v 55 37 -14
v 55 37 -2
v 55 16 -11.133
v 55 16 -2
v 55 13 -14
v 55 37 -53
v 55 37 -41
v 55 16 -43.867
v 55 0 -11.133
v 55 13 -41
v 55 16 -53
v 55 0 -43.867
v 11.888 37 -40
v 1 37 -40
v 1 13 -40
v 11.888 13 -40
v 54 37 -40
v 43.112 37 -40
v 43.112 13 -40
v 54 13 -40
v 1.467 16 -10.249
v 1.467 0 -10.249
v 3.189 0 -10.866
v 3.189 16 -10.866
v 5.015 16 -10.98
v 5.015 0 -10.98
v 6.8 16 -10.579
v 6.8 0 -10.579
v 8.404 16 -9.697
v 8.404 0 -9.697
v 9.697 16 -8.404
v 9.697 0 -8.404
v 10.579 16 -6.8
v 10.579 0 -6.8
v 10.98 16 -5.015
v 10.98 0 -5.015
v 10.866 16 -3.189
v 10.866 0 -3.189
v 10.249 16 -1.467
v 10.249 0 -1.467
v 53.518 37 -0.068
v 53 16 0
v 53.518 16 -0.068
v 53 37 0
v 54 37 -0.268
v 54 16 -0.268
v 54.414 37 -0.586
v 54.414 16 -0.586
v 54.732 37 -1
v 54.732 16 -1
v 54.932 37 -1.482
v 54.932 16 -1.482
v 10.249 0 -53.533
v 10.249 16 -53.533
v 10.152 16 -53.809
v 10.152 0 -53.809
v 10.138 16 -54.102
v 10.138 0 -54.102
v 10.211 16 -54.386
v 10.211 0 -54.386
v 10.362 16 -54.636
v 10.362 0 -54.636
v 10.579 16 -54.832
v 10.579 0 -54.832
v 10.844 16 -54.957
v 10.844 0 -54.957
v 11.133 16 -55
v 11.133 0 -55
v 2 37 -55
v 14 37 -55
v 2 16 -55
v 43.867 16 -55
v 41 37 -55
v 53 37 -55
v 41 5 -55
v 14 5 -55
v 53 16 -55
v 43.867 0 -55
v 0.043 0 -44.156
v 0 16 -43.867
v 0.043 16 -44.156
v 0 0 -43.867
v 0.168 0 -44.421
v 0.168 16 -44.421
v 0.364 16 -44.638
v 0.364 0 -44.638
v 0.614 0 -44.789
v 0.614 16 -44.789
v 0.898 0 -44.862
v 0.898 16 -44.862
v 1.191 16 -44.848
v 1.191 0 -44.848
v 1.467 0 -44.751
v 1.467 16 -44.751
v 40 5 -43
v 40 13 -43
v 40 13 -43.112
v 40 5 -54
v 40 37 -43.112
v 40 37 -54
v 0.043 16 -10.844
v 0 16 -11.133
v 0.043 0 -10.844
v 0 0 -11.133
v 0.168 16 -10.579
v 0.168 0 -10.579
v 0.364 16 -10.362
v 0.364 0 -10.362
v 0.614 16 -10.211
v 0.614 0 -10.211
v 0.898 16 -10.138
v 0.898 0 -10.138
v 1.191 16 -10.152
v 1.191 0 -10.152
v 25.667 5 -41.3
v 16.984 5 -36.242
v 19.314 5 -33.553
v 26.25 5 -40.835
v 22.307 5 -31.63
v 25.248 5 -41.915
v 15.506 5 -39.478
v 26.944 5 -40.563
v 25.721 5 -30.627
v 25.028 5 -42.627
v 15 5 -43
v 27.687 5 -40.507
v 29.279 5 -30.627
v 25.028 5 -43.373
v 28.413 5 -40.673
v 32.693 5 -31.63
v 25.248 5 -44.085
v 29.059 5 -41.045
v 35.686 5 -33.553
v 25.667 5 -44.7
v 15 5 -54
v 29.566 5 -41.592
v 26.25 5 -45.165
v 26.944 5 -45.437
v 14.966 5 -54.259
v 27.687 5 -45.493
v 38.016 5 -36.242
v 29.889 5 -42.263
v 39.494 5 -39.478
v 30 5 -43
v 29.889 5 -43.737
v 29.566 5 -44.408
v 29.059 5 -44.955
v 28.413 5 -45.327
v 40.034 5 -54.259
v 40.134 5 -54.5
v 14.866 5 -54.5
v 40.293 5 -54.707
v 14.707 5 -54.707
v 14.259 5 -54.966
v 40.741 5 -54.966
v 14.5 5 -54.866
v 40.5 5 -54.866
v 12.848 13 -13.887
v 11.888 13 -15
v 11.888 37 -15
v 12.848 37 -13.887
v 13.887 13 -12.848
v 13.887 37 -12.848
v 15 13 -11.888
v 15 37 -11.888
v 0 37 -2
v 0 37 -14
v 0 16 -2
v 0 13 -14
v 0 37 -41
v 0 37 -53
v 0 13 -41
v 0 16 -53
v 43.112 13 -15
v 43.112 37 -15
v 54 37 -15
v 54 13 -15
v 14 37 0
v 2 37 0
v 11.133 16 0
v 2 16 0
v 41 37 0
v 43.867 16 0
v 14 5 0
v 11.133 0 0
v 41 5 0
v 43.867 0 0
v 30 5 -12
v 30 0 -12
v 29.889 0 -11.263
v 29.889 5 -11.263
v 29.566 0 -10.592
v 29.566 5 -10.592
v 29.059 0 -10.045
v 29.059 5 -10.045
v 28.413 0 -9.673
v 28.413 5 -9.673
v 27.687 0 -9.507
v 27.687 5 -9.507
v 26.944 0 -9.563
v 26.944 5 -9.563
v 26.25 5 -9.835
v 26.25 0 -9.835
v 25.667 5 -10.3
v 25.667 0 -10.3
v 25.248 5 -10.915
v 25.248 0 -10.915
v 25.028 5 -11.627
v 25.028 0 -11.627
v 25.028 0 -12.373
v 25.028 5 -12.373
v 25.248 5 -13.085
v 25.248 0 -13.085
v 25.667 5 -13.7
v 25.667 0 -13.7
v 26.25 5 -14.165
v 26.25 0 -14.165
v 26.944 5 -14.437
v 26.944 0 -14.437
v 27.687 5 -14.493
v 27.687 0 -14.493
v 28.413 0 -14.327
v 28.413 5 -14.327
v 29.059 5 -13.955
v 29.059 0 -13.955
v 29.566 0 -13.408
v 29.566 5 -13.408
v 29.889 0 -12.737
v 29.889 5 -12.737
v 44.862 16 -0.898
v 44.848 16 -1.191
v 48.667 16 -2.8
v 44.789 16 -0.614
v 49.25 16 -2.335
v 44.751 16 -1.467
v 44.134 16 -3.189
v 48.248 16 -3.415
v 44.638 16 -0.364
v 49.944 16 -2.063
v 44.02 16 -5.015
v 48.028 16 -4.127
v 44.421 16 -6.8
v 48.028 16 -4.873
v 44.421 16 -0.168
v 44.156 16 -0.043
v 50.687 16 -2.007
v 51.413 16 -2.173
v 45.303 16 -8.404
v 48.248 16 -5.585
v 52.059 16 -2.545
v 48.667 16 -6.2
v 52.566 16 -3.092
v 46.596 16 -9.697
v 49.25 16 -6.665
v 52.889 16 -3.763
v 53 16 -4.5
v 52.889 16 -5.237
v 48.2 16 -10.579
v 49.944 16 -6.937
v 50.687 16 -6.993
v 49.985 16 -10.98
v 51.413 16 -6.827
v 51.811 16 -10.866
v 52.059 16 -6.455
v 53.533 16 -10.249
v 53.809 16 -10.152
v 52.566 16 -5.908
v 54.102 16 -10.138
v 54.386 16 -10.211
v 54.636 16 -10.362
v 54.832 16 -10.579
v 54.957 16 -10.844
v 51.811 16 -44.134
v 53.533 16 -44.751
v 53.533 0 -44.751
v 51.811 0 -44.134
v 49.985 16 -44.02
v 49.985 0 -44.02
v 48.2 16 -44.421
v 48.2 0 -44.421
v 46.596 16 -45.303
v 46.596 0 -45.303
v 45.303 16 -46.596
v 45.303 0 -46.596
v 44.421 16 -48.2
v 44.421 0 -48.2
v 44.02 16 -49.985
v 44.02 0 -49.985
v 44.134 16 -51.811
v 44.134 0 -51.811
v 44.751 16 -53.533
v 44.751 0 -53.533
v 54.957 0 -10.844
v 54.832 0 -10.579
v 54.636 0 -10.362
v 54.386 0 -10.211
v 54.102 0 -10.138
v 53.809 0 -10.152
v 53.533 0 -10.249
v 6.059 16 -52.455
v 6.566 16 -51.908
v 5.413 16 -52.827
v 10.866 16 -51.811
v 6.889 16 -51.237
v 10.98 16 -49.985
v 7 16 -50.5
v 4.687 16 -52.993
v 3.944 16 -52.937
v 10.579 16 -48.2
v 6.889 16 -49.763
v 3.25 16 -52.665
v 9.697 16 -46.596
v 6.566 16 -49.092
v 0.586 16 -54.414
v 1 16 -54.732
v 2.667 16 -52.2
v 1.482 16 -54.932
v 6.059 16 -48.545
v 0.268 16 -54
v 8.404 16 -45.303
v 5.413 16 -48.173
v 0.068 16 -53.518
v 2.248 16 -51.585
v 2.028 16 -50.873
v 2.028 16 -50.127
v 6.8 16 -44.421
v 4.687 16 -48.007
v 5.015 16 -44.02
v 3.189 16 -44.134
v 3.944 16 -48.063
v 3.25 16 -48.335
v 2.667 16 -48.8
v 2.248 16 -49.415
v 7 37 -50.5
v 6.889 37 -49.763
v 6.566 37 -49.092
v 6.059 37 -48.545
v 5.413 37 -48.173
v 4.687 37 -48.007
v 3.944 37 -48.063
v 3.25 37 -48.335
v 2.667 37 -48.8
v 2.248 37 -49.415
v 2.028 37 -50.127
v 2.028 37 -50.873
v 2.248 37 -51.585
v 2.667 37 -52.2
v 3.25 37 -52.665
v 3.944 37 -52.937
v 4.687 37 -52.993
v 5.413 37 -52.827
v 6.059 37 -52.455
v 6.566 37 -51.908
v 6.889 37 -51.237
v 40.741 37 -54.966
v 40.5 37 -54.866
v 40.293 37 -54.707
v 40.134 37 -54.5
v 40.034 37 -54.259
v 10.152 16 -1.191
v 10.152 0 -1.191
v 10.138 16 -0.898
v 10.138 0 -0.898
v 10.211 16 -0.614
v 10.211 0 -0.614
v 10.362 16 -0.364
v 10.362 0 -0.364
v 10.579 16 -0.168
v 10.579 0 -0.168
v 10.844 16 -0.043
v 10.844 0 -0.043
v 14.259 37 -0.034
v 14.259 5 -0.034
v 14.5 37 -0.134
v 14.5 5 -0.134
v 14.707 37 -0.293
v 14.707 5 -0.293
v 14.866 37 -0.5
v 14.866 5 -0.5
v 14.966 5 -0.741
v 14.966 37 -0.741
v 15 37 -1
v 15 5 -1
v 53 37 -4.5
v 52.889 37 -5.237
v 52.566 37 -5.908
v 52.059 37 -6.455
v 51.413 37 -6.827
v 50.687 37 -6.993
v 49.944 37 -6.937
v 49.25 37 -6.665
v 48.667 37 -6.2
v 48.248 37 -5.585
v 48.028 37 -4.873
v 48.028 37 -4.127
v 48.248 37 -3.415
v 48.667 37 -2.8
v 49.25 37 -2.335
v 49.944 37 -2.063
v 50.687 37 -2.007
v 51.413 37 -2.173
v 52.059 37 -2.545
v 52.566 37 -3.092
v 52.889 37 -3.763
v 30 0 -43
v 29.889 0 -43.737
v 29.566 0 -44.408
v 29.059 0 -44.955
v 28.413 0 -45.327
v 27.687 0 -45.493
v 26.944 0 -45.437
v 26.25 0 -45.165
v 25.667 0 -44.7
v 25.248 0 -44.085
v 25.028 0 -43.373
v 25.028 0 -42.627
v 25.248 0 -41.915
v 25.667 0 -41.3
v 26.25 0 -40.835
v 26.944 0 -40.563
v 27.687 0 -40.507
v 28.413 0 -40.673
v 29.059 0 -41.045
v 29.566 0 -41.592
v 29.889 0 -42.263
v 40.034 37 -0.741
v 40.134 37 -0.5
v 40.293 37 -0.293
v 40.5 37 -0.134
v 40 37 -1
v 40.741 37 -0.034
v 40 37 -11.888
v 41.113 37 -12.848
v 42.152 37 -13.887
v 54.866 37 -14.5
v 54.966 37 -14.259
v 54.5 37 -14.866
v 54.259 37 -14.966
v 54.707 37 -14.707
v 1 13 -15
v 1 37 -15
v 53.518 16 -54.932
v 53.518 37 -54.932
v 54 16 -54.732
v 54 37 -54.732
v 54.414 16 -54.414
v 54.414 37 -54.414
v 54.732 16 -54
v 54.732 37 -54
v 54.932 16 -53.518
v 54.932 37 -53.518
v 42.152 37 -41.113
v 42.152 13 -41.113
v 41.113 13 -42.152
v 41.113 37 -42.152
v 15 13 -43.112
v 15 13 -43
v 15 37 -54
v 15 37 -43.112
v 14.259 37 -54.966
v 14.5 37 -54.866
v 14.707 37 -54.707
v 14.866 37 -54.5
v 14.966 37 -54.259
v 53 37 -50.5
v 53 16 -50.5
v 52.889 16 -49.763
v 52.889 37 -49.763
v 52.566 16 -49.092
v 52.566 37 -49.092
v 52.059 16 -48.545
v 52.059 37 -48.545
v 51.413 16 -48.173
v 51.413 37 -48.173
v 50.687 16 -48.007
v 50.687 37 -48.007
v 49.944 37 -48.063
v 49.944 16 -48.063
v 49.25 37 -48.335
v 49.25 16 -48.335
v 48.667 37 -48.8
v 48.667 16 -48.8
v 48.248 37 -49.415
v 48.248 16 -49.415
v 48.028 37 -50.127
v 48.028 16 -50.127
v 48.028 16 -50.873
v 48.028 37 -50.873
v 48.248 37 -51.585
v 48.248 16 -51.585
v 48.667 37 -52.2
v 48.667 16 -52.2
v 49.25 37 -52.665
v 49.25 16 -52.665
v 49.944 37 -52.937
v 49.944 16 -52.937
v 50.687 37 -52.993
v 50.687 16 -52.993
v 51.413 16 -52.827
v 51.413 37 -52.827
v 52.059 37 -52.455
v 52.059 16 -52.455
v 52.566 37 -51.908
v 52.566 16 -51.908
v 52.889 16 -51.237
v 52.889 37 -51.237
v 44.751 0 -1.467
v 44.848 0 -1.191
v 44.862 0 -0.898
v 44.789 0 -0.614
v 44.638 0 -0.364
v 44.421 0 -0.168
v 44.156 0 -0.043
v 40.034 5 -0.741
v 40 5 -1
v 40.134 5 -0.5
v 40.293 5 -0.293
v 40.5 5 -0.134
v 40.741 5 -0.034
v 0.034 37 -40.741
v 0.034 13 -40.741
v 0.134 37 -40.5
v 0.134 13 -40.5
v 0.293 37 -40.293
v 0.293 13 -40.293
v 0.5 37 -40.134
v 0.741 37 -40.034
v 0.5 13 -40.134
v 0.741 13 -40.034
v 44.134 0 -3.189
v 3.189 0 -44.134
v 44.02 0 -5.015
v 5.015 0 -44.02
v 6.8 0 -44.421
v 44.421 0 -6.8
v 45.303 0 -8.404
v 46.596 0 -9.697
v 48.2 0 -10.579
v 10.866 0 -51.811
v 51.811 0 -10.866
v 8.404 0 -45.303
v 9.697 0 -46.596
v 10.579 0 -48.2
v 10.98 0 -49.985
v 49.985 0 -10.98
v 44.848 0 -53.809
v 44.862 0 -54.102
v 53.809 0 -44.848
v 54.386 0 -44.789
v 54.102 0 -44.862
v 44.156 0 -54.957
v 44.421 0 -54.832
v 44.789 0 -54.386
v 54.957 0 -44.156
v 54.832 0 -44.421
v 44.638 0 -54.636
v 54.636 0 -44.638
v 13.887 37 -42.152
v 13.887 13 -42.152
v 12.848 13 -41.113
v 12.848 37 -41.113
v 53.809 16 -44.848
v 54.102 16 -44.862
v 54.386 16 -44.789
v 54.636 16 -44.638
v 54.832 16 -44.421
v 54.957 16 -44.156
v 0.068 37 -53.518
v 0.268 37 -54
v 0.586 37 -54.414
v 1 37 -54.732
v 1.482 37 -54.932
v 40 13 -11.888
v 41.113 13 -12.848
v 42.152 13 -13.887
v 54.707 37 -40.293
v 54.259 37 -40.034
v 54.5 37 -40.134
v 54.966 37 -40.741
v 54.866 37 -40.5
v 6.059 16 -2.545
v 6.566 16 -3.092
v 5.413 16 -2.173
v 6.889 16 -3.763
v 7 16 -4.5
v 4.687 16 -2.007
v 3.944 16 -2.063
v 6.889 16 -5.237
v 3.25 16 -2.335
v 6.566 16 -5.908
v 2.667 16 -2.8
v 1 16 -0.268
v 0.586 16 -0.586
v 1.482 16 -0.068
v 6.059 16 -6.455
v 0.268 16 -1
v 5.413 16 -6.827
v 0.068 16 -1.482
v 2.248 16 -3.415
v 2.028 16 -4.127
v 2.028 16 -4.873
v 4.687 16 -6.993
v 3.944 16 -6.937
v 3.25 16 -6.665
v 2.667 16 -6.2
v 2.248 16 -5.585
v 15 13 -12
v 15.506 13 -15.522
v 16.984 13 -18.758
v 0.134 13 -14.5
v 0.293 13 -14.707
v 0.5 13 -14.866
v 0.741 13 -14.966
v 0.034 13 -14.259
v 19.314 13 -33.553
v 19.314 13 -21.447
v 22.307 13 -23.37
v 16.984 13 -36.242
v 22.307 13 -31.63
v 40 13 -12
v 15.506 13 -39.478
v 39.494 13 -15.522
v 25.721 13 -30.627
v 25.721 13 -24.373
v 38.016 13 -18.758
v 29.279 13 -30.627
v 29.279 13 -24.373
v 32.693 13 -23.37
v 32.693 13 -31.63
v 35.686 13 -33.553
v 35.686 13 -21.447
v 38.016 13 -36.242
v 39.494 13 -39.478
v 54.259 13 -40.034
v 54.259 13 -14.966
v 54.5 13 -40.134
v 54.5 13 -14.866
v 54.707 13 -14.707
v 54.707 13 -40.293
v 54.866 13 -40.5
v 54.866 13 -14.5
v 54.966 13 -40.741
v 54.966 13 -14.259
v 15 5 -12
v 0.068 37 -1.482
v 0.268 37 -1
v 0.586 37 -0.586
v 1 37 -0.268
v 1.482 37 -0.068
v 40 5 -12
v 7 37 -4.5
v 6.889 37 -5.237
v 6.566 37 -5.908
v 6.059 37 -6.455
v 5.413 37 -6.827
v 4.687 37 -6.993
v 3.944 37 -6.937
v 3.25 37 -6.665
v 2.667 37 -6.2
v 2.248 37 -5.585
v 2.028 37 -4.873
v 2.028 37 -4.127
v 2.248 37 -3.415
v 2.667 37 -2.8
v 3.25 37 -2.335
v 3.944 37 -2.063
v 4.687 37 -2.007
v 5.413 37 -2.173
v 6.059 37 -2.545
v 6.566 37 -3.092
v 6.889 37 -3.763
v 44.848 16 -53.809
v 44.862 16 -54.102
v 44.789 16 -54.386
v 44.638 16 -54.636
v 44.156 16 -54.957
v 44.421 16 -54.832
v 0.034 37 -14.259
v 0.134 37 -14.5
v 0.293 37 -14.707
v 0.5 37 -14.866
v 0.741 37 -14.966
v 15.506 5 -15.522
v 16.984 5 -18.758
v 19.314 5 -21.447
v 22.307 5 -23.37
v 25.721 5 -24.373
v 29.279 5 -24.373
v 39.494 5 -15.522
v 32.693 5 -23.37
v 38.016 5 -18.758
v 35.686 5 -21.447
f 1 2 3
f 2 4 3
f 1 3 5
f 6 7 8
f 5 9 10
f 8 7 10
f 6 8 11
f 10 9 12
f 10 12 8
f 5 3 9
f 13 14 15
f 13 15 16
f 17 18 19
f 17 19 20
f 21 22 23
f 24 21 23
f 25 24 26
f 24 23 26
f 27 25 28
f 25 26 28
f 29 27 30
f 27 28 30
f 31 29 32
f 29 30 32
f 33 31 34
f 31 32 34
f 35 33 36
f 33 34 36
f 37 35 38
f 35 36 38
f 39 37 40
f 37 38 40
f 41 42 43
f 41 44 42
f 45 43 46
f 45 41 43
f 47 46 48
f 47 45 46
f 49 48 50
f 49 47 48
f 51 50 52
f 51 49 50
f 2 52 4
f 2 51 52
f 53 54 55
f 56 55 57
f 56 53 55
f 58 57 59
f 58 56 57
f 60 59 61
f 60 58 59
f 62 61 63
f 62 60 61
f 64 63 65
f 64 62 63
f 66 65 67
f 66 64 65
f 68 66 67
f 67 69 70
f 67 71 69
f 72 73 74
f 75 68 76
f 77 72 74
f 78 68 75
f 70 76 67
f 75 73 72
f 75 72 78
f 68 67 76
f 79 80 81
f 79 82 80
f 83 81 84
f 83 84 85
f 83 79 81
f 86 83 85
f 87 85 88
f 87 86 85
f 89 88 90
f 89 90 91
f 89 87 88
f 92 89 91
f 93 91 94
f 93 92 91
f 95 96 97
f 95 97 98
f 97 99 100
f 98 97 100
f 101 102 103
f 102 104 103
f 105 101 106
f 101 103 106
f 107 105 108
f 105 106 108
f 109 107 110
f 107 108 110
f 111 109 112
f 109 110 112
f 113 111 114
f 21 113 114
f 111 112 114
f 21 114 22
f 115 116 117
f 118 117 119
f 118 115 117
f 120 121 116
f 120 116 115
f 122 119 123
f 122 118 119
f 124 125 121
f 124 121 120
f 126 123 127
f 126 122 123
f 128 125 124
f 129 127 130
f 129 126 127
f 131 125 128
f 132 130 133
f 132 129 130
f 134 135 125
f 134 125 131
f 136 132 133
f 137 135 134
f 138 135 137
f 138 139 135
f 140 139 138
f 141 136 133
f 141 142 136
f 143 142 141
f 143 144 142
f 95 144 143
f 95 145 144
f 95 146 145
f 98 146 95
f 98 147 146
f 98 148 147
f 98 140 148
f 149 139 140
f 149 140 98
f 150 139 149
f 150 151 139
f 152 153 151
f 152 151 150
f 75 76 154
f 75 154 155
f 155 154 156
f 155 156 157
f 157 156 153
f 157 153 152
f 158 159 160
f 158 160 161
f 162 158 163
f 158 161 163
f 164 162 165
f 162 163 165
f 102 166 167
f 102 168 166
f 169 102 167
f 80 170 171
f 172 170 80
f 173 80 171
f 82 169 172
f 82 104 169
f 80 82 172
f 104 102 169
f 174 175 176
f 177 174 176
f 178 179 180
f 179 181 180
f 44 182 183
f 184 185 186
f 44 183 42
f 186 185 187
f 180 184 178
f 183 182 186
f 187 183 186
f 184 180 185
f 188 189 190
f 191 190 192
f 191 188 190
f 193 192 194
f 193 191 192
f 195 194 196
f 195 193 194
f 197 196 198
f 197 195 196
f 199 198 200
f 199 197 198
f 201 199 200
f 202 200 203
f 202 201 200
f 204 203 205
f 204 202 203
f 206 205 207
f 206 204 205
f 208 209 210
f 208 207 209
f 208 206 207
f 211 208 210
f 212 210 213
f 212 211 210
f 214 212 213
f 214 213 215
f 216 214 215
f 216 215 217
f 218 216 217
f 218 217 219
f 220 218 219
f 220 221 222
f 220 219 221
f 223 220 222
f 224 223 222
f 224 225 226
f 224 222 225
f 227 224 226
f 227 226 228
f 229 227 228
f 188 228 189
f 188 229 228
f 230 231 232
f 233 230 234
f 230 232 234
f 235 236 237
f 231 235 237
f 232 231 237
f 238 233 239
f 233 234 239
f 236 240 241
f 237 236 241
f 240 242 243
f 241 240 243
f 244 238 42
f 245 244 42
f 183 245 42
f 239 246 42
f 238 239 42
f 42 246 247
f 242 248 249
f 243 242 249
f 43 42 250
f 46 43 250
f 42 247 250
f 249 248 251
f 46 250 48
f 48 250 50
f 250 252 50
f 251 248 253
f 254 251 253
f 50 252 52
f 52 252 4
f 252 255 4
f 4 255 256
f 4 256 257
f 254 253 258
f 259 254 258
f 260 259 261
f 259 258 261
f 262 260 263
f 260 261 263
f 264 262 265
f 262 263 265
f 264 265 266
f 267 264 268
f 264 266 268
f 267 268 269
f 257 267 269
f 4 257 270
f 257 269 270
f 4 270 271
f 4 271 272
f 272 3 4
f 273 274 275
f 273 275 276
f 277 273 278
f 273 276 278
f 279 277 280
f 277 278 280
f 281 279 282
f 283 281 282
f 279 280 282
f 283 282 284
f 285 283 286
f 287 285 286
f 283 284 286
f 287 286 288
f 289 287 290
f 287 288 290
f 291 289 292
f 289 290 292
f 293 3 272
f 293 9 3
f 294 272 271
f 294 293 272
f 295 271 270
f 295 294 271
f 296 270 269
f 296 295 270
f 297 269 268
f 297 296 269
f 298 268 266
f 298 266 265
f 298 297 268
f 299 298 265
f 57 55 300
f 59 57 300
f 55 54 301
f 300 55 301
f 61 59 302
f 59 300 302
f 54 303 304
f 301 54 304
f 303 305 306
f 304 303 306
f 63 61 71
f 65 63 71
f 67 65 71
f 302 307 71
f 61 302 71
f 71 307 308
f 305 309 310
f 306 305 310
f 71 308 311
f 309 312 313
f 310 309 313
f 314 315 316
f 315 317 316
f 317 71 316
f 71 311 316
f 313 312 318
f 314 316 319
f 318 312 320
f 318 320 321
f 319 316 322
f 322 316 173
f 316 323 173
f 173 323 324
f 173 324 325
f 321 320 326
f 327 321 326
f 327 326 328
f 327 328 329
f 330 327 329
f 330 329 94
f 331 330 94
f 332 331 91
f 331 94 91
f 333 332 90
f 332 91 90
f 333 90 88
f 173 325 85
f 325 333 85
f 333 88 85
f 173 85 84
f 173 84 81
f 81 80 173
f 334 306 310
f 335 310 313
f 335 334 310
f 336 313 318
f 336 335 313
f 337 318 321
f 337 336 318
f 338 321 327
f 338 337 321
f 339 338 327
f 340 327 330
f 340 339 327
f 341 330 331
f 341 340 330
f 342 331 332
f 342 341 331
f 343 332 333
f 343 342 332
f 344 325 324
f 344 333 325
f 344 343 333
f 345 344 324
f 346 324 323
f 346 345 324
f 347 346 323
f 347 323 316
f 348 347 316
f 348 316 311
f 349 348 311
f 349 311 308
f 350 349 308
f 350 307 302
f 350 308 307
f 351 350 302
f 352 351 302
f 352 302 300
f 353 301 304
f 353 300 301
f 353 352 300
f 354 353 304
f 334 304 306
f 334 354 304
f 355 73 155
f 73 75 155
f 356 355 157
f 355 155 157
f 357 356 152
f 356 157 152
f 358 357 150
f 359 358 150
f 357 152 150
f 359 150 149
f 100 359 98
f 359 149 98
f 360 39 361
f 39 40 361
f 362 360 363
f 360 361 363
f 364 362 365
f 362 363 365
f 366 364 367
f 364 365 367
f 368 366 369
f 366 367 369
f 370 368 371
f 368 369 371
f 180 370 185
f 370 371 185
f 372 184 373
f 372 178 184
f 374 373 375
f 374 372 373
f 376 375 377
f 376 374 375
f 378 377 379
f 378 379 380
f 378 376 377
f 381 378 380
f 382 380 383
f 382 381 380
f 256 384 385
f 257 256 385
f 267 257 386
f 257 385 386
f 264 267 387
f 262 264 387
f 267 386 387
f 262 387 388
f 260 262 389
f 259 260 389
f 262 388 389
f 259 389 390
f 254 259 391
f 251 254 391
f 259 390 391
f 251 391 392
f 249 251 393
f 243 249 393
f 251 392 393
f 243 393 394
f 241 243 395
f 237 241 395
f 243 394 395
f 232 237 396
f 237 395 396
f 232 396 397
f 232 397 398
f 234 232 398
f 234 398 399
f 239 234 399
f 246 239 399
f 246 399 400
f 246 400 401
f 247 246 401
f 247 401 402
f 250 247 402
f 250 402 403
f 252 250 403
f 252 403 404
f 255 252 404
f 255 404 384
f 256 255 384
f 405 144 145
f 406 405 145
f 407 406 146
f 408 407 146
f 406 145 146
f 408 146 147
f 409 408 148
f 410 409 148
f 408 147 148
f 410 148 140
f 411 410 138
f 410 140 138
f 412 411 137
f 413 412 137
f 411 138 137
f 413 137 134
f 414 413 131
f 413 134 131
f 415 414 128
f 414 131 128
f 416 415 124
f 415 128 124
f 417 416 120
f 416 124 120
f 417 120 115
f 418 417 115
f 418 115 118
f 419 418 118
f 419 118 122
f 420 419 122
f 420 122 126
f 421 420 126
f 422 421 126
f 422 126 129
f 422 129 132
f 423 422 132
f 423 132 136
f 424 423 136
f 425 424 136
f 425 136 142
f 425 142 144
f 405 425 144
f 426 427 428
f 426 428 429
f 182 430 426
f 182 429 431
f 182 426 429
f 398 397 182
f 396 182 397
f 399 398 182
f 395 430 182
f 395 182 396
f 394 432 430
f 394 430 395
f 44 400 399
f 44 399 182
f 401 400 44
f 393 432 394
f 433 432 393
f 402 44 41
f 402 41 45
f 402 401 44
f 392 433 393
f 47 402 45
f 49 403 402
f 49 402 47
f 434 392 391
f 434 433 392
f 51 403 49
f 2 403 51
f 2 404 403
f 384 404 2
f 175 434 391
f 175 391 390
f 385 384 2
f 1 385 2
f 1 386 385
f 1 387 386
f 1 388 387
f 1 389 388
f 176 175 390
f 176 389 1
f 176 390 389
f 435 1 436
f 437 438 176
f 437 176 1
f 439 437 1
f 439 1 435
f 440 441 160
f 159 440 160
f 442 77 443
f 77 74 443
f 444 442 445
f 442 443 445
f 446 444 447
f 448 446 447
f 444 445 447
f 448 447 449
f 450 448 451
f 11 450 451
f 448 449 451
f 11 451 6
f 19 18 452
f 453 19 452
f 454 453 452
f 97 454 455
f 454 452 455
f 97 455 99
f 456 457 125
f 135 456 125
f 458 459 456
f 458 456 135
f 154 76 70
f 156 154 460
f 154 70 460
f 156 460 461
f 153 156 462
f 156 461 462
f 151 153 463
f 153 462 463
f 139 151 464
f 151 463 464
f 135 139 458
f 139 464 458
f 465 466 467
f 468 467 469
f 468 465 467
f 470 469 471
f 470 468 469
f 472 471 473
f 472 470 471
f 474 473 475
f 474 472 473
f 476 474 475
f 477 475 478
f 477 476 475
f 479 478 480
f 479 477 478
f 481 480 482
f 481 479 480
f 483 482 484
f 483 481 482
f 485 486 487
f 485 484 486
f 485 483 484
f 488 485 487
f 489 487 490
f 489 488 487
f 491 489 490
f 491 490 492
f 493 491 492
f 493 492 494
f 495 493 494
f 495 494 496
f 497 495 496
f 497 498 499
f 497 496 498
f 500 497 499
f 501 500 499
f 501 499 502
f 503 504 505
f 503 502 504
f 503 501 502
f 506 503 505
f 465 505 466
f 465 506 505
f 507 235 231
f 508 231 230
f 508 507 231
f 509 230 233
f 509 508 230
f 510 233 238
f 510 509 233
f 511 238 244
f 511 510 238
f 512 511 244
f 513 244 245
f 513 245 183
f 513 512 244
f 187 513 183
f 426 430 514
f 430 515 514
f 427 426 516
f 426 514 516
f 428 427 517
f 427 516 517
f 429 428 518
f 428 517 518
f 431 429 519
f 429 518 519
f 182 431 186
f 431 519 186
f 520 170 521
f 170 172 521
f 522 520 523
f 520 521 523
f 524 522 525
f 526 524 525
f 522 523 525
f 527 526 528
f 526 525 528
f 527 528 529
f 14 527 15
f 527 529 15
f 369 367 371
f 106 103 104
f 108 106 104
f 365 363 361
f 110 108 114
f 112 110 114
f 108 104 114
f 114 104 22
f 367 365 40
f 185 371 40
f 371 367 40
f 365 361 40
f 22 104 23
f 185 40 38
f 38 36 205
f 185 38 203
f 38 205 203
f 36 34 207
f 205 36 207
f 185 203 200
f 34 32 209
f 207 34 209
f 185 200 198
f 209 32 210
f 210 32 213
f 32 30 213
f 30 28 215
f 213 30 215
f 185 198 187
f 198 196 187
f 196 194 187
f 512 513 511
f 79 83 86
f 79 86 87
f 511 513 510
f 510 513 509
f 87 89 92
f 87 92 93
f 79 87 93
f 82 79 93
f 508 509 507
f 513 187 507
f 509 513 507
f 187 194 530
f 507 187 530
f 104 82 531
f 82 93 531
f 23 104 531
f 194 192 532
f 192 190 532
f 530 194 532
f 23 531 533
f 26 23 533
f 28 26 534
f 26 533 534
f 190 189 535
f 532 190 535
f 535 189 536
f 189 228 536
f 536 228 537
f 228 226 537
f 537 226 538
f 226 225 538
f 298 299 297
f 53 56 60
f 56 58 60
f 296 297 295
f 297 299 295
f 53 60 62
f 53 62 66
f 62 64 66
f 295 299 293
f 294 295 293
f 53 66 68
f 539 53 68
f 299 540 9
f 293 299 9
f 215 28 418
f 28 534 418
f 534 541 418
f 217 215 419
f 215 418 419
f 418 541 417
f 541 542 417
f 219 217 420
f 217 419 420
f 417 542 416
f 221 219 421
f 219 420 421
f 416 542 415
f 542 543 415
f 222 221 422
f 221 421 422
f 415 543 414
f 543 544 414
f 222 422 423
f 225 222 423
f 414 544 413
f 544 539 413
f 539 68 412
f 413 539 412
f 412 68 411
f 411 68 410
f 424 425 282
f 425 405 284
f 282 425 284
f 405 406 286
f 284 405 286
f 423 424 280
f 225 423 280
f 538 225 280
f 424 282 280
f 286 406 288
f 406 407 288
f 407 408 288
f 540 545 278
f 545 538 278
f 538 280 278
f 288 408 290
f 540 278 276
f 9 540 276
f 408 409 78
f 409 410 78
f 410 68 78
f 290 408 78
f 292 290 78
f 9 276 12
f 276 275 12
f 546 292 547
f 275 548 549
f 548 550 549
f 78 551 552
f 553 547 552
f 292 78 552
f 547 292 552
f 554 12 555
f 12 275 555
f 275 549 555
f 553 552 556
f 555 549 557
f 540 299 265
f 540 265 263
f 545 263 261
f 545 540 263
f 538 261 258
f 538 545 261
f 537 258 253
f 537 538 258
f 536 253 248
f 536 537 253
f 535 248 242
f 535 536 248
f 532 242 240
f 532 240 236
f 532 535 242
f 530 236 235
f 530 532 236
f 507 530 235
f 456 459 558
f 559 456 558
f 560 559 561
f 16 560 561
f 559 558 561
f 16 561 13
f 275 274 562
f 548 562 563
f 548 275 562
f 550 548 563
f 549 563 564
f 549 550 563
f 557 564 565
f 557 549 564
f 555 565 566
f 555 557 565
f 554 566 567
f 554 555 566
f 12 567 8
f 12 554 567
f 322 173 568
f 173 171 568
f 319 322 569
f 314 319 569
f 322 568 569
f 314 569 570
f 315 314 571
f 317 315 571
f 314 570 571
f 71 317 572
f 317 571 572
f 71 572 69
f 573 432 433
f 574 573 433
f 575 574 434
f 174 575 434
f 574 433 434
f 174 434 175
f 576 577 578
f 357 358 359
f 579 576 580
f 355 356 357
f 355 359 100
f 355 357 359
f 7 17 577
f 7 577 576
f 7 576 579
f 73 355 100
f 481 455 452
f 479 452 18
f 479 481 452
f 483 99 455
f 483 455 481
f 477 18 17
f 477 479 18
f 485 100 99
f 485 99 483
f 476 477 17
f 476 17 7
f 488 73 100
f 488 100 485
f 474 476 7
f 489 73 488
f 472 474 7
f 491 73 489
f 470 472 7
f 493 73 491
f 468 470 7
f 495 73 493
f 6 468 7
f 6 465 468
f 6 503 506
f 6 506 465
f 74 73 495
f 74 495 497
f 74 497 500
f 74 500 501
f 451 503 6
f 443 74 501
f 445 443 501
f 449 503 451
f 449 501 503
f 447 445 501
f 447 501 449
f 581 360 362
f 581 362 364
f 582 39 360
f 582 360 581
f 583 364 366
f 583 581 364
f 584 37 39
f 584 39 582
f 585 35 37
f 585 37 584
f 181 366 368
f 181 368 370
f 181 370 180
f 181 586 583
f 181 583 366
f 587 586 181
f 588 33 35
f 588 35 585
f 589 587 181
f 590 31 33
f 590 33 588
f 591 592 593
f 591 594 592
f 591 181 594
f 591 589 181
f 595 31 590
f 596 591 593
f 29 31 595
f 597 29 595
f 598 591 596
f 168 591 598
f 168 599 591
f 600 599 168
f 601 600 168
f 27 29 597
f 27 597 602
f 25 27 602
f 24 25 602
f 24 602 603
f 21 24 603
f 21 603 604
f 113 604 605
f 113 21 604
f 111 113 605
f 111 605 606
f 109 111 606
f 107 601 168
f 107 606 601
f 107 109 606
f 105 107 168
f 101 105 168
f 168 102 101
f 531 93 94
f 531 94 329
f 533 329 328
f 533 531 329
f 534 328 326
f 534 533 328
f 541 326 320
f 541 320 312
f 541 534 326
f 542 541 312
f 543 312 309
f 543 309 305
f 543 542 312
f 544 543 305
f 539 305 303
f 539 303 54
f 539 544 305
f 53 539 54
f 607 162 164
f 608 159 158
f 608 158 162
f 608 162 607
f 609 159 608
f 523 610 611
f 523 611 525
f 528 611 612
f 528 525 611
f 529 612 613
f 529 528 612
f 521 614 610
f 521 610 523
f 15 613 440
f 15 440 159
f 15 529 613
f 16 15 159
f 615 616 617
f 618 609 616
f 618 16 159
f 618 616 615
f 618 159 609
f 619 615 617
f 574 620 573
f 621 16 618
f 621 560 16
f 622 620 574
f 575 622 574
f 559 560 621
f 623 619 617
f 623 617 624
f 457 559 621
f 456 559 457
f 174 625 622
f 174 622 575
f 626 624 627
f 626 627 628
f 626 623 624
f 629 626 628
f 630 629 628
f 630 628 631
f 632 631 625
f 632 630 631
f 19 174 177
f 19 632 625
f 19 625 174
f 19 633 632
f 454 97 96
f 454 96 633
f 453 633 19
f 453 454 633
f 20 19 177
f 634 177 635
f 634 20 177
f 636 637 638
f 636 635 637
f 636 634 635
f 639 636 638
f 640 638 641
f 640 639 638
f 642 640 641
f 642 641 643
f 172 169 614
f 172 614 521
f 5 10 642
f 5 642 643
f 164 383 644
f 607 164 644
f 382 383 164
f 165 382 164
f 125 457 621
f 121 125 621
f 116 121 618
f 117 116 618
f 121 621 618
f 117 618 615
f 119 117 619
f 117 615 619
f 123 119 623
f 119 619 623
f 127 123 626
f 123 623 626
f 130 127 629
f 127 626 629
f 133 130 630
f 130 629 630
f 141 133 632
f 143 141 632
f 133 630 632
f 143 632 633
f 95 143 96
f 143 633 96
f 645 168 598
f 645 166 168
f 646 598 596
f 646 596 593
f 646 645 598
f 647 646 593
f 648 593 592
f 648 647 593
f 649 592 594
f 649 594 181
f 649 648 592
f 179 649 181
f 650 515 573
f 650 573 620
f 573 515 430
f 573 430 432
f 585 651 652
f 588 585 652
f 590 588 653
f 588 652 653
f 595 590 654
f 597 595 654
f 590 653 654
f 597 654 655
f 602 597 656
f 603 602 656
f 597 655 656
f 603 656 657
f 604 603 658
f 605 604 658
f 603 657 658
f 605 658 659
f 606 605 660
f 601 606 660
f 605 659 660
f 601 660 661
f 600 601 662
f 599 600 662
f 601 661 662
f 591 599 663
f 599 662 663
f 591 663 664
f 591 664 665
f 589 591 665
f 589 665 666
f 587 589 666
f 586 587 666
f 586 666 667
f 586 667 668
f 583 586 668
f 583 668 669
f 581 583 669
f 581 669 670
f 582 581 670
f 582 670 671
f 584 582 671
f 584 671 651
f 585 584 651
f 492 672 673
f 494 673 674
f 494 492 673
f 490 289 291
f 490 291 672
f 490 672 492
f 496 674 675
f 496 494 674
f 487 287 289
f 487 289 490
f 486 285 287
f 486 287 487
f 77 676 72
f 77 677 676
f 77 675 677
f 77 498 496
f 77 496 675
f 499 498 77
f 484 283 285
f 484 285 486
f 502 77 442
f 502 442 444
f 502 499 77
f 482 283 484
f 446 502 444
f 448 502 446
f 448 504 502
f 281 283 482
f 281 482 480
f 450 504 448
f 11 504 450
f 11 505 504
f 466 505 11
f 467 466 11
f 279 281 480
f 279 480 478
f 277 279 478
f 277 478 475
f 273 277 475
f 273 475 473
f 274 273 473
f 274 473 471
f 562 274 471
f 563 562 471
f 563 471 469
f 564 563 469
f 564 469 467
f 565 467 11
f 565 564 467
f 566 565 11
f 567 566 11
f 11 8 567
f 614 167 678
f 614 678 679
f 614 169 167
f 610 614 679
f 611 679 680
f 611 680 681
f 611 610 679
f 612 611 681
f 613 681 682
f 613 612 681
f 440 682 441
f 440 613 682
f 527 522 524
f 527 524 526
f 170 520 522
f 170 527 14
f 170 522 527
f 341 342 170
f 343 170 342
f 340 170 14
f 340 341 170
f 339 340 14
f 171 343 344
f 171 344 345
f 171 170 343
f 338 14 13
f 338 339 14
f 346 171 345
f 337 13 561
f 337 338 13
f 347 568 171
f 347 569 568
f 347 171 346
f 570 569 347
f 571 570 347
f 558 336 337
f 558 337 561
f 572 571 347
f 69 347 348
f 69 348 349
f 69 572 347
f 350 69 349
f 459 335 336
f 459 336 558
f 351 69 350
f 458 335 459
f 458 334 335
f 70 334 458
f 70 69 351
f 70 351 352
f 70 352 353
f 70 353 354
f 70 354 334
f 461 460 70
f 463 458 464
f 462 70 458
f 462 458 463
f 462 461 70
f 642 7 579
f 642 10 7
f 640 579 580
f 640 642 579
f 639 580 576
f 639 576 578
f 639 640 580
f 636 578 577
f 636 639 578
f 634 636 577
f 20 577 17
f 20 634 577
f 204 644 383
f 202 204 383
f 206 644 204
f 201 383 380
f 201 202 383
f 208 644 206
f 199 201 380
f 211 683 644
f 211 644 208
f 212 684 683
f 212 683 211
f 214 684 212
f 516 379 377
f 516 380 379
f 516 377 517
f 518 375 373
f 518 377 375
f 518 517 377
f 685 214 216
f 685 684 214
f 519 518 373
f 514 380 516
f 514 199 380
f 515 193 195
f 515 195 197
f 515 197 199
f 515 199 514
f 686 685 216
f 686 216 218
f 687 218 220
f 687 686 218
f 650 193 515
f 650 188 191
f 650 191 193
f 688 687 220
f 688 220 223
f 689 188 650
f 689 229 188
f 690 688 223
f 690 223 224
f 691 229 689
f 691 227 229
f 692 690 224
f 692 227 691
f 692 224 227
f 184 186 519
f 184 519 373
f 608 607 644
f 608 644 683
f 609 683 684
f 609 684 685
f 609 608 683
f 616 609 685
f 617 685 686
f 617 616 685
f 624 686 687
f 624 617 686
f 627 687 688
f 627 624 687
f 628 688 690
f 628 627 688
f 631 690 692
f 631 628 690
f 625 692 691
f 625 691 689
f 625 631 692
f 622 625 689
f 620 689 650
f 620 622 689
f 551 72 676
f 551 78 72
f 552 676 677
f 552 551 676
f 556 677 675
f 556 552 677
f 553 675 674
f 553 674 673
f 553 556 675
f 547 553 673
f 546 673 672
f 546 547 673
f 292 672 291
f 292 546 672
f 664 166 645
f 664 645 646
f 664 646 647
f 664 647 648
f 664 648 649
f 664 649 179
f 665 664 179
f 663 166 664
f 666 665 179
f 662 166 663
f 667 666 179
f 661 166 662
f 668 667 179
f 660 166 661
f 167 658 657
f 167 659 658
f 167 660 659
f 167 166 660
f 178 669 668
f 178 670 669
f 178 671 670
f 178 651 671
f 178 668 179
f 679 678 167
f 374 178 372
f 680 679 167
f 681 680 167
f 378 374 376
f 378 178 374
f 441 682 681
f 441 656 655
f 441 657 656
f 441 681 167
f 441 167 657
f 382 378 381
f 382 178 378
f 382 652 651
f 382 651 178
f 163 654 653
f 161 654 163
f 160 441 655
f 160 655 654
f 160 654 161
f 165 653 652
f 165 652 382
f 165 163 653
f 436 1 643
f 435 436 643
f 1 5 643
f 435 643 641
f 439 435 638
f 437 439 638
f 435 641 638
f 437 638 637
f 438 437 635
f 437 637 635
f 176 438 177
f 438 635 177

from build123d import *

# Parameters (mm, degrees)
SKETCH1_W               = 55
SKETCH1_H               = 55
BOSS_EXTRUDE1_DEPTH     = 37
SKETCH2_R               = 20
CUT_EXTRUDE1_DEPTH      = 24
SKETCH3_W               = 25
SKETCH3_H               = 55
CUT_EXTRUDE2_DEPTH      = 24
SKETCH4_W               = 55
SKETCH4_H               = 25
CUT_EXTRUDE3_DEPTH      = 24
SKETCH5_R               = 2.5
CUT_EXTRUDE4_DEPTH      = 38
SKETCH6_R               = 2.5
CUT_EXTRUDE5_DEPTH      = 38
SKETCH8_R               = 6.5
CUT_EXTRUDE6_DEPTH      = 16
CUT_EXTRUDE11_DEPTH     = 8
SKETCH16_W              = 25
SKETCH16_H              = 12
CUT_EXTRUDE12_DEPTH     = 8
SKETCH17_W              = 25
SKETCH17_H              = 12
CUT_EXTRUDE13_DEPTH     = 8
SKETCH18_R              = 2.5
CUT_EXTRUDE14_DEPTH     = 6
MIRROR5_COPY_1_SKETCH_R = 6.5
MIRROR5_COPY_1_DEPTH    = 16
FILLET2_R               = 2
FILLET3_R               = 1
FILLET4_R               = 1


with BuildPart() as part:
    # Sketch1 → Boss-Extrude1 (new body)
    with BuildSketch(Plane(origin=(0, 0, 0), x_dir=(1, 0, 0), z_dir=(0, 1, 0))):
        with Locations((27.5, 27.5)):
            Rectangle(SKETCH1_W, SKETCH1_H)
    extrude(amount=BOSS_EXTRUDE1_DEPTH)

    # Sketch2 → Cut-Extrude1 (cut)
    with BuildSketch(Plane(origin=(0, 37, 0), x_dir=(1, 0, 0), z_dir=(0, 1, 0))):
        with Locations((27.5, 27.5)):
            Circle(SKETCH2_R)
    extrude(amount=-CUT_EXTRUDE1_DEPTH, mode=Mode.SUBTRACT)

    # Sketch3 → Cut-Extrude2 (cut)
    with BuildSketch(Plane(origin=(0, 37, 0), x_dir=(1, 0, 0), z_dir=(0, 1, 0))):
        with Locations((27.5, 27.5)):
            Rectangle(SKETCH3_W, SKETCH3_H)
    cut_extrude2 = extrude(amount=-CUT_EXTRUDE2_DEPTH, mode=Mode.SUBTRACT)

    # Sketch4 → Cut-Extrude3 (cut)
    with BuildSketch(Plane(origin=(0, 37, 0), x_dir=(1, 0, 0), z_dir=(0, 1, 0))):
        with Locations((27.5, 27.5)):
            Rectangle(SKETCH4_W, SKETCH4_H)
    extrude(amount=-CUT_EXTRUDE3_DEPTH, mode=Mode.SUBTRACT)

    # Sketch5 → Cut-Extrude4 (cut, through all)
    with BuildSketch(Plane(origin=(0, 37, 0), x_dir=(1, 0, 0), z_dir=(0, 1, 0))):
        with Locations((4.5, 4.5)):
            Circle(SKETCH5_R)
    cut_extrude4 = extrude(amount=-CUT_EXTRUDE4_DEPTH, mode=Mode.SUBTRACT)

    # Sketch6 → Cut-Extrude5 (cut, through all)
    with BuildSketch(Plane(origin=(0, 37, 0), x_dir=(1, 0, 0), z_dir=(0, 1, 0))):
        with Locations((50.5, 4.5)):
            Circle(SKETCH6_R)
    cut_extrude5 = extrude(amount=-CUT_EXTRUDE5_DEPTH, mode=Mode.SUBTRACT)

    # Mirror1: Cut-Extrude4, Cut-Extrude5 across plane
    add(cut_extrude4.mirror(Plane(origin=(0, 0, -27.5), x_dir=(1, 0, 0), z_dir=(0, 0, -1))), mode=Mode.SUBTRACT)
    add(cut_extrude5.mirror(Plane(origin=(0, 0, -27.5), x_dir=(1, 0, 0), z_dir=(0, 0, -1))), mode=Mode.SUBTRACT)

    # Sketch8 → Cut-Extrude6 (cut)
    with BuildSketch(Plane.XZ):
        with Locations((50.5, -50.5)):
            Circle(SKETCH8_R)
    cut_extrude6 = extrude(amount=-CUT_EXTRUDE6_DEPTH, mode=Mode.SUBTRACT)

    # Sketch15 → Cut-Extrude11 (cut)
    with BuildSketch(Plane(origin=(0, 13, 0), x_dir=(1, 0, 0), z_dir=(0, 1, 0))):
        with BuildLine():
            ThreePointArc((24, 55), (20, 33), (40, 43))
            ThreePointArc((40, 43), (37.5, 50.5), (31, 55))
            Line((31, 55), (24, 55))
        make_face()
        with BuildLine():
            Line((24, 55), (31, 55))
            ThreePointArc((31, 55), (27.5, 55.5), (24, 55))
        make_face()
    cut_extrude11 = extrude(amount=-CUT_EXTRUDE11_DEPTH, mode=Mode.SUBTRACT)

    # Sketch16 → Cut-Extrude12 (cut)
    with BuildSketch(Plane(origin=(0, 13, 0), x_dir=(1, 0, 0), z_dir=(0, 1, 0))):
        with Locations((27.5, 49)):
            Rectangle(SKETCH16_W, SKETCH16_H)
    extrude(amount=-CUT_EXTRUDE12_DEPTH, mode=Mode.SUBTRACT)

    # Mirror2: Cut-Extrude2, Cut-Extrude11 across plane
    add(cut_extrude2.mirror(Plane(origin=(0, 0, -27.5), x_dir=(1, 0, 0), z_dir=(0, 0, -1))), mode=Mode.SUBTRACT)
    add(cut_extrude11.mirror(Plane(origin=(0, 0, -27.5), x_dir=(1, 0, 0), z_dir=(0, 0, -1))), mode=Mode.SUBTRACT)

    # Sketch17 → Cut-Extrude13 (cut)
    with BuildSketch(Plane(origin=(0, 13, 0), x_dir=(1, 0, 0), z_dir=(0, 1, 0))):
        with Locations((27.5, 6)):
            Rectangle(SKETCH17_W, SKETCH17_H)
    extrude(amount=-CUT_EXTRUDE13_DEPTH, mode=Mode.SUBTRACT)

    # Sketch18 → Cut-Extrude14 (cut, through all)
    with BuildSketch(Plane(origin=(0, 5, 0), x_dir=(1, 0, 0), z_dir=(0, 1, 0))):
        with Locations((27.5, 43)):
            Circle(SKETCH18_R)
    cut_extrude14 = extrude(amount=-CUT_EXTRUDE14_DEPTH, mode=Mode.SUBTRACT)

    # Mirror3: Cut-Extrude14 across plane
    add(cut_extrude14.mirror(Plane(origin=(0, 0, -27.5), x_dir=(1, 0, 0), z_dir=(0, 0, -1))), mode=Mode.SUBTRACT)

    # Mirror4: Cut-Extrude6 across plane
    add(cut_extrude6.mirror(Plane(origin=(27.5, 0, 0), x_dir=(0, 0, 1), z_dir=(1, 0, 0))), mode=Mode.SUBTRACT)

    # Mirror5: Cut-Extrude6 across plane
    add(cut_extrude6.mirror(Plane(origin=(0, 0, -27.5), x_dir=(1, 0, 0), z_dir=(0, 0, -1))), mode=Mode.SUBTRACT)

    # Mirror5 copy 1 sketch → Mirror5 copy 1 (cut)
    with BuildSketch(Plane(origin=(55, 0, -55), x_dir=(-1, 0, 0), z_dir=(0, -1, 0))):
        with Locations((50.5, -50.5)):
            Circle(MIRROR5_COPY_1_SKETCH_R)
    extrude(amount=-MIRROR5_COPY_1_DEPTH, mode=Mode.SUBTRACT)

    # Fillet2
    fillet2_edges = [part.edges().sort_by_distance(p)[0] for p in [
        (0, 26.5, -55),
        (55, 26.5, -55),
        (55, 26.5, 0),
        (0, 26.5, 0),
    ]]
    fillet(fillet2_edges, radius=FILLET2_R)

    # Fillet3
    fillet3_edges = [part.edges().sort_by_distance(p)[0] for p in [
        (55, 8, -45.80958424),
        (45.80958424, 8, -55),
        (0, 8, -45.80958424),
        (9.19041576, 8, -55),
        (0, 8, -9.19041576),
        (9.19041576, 8, 0),
        (45.80958424, 8, 0),
        (55, 8, -9.19041576),
    ]]
    fillet(fillet3_edges, radius=FILLET3_R)

    # Fillet4
    fillet4_edges = [part.edges().sort_by_distance(p)[0] for p in [
        (15, 21, 0),
        (40, 21, -55),
        (15, 21, -55),
        (40, 21, 0),
        (0, 25, -40),
        (55, 25, -15),
        (0, 25, -15),
        (55, 25, -40),
    ]]
    fillet(fillet4_edges, radius=FILLET4_R)


solid = part.part
